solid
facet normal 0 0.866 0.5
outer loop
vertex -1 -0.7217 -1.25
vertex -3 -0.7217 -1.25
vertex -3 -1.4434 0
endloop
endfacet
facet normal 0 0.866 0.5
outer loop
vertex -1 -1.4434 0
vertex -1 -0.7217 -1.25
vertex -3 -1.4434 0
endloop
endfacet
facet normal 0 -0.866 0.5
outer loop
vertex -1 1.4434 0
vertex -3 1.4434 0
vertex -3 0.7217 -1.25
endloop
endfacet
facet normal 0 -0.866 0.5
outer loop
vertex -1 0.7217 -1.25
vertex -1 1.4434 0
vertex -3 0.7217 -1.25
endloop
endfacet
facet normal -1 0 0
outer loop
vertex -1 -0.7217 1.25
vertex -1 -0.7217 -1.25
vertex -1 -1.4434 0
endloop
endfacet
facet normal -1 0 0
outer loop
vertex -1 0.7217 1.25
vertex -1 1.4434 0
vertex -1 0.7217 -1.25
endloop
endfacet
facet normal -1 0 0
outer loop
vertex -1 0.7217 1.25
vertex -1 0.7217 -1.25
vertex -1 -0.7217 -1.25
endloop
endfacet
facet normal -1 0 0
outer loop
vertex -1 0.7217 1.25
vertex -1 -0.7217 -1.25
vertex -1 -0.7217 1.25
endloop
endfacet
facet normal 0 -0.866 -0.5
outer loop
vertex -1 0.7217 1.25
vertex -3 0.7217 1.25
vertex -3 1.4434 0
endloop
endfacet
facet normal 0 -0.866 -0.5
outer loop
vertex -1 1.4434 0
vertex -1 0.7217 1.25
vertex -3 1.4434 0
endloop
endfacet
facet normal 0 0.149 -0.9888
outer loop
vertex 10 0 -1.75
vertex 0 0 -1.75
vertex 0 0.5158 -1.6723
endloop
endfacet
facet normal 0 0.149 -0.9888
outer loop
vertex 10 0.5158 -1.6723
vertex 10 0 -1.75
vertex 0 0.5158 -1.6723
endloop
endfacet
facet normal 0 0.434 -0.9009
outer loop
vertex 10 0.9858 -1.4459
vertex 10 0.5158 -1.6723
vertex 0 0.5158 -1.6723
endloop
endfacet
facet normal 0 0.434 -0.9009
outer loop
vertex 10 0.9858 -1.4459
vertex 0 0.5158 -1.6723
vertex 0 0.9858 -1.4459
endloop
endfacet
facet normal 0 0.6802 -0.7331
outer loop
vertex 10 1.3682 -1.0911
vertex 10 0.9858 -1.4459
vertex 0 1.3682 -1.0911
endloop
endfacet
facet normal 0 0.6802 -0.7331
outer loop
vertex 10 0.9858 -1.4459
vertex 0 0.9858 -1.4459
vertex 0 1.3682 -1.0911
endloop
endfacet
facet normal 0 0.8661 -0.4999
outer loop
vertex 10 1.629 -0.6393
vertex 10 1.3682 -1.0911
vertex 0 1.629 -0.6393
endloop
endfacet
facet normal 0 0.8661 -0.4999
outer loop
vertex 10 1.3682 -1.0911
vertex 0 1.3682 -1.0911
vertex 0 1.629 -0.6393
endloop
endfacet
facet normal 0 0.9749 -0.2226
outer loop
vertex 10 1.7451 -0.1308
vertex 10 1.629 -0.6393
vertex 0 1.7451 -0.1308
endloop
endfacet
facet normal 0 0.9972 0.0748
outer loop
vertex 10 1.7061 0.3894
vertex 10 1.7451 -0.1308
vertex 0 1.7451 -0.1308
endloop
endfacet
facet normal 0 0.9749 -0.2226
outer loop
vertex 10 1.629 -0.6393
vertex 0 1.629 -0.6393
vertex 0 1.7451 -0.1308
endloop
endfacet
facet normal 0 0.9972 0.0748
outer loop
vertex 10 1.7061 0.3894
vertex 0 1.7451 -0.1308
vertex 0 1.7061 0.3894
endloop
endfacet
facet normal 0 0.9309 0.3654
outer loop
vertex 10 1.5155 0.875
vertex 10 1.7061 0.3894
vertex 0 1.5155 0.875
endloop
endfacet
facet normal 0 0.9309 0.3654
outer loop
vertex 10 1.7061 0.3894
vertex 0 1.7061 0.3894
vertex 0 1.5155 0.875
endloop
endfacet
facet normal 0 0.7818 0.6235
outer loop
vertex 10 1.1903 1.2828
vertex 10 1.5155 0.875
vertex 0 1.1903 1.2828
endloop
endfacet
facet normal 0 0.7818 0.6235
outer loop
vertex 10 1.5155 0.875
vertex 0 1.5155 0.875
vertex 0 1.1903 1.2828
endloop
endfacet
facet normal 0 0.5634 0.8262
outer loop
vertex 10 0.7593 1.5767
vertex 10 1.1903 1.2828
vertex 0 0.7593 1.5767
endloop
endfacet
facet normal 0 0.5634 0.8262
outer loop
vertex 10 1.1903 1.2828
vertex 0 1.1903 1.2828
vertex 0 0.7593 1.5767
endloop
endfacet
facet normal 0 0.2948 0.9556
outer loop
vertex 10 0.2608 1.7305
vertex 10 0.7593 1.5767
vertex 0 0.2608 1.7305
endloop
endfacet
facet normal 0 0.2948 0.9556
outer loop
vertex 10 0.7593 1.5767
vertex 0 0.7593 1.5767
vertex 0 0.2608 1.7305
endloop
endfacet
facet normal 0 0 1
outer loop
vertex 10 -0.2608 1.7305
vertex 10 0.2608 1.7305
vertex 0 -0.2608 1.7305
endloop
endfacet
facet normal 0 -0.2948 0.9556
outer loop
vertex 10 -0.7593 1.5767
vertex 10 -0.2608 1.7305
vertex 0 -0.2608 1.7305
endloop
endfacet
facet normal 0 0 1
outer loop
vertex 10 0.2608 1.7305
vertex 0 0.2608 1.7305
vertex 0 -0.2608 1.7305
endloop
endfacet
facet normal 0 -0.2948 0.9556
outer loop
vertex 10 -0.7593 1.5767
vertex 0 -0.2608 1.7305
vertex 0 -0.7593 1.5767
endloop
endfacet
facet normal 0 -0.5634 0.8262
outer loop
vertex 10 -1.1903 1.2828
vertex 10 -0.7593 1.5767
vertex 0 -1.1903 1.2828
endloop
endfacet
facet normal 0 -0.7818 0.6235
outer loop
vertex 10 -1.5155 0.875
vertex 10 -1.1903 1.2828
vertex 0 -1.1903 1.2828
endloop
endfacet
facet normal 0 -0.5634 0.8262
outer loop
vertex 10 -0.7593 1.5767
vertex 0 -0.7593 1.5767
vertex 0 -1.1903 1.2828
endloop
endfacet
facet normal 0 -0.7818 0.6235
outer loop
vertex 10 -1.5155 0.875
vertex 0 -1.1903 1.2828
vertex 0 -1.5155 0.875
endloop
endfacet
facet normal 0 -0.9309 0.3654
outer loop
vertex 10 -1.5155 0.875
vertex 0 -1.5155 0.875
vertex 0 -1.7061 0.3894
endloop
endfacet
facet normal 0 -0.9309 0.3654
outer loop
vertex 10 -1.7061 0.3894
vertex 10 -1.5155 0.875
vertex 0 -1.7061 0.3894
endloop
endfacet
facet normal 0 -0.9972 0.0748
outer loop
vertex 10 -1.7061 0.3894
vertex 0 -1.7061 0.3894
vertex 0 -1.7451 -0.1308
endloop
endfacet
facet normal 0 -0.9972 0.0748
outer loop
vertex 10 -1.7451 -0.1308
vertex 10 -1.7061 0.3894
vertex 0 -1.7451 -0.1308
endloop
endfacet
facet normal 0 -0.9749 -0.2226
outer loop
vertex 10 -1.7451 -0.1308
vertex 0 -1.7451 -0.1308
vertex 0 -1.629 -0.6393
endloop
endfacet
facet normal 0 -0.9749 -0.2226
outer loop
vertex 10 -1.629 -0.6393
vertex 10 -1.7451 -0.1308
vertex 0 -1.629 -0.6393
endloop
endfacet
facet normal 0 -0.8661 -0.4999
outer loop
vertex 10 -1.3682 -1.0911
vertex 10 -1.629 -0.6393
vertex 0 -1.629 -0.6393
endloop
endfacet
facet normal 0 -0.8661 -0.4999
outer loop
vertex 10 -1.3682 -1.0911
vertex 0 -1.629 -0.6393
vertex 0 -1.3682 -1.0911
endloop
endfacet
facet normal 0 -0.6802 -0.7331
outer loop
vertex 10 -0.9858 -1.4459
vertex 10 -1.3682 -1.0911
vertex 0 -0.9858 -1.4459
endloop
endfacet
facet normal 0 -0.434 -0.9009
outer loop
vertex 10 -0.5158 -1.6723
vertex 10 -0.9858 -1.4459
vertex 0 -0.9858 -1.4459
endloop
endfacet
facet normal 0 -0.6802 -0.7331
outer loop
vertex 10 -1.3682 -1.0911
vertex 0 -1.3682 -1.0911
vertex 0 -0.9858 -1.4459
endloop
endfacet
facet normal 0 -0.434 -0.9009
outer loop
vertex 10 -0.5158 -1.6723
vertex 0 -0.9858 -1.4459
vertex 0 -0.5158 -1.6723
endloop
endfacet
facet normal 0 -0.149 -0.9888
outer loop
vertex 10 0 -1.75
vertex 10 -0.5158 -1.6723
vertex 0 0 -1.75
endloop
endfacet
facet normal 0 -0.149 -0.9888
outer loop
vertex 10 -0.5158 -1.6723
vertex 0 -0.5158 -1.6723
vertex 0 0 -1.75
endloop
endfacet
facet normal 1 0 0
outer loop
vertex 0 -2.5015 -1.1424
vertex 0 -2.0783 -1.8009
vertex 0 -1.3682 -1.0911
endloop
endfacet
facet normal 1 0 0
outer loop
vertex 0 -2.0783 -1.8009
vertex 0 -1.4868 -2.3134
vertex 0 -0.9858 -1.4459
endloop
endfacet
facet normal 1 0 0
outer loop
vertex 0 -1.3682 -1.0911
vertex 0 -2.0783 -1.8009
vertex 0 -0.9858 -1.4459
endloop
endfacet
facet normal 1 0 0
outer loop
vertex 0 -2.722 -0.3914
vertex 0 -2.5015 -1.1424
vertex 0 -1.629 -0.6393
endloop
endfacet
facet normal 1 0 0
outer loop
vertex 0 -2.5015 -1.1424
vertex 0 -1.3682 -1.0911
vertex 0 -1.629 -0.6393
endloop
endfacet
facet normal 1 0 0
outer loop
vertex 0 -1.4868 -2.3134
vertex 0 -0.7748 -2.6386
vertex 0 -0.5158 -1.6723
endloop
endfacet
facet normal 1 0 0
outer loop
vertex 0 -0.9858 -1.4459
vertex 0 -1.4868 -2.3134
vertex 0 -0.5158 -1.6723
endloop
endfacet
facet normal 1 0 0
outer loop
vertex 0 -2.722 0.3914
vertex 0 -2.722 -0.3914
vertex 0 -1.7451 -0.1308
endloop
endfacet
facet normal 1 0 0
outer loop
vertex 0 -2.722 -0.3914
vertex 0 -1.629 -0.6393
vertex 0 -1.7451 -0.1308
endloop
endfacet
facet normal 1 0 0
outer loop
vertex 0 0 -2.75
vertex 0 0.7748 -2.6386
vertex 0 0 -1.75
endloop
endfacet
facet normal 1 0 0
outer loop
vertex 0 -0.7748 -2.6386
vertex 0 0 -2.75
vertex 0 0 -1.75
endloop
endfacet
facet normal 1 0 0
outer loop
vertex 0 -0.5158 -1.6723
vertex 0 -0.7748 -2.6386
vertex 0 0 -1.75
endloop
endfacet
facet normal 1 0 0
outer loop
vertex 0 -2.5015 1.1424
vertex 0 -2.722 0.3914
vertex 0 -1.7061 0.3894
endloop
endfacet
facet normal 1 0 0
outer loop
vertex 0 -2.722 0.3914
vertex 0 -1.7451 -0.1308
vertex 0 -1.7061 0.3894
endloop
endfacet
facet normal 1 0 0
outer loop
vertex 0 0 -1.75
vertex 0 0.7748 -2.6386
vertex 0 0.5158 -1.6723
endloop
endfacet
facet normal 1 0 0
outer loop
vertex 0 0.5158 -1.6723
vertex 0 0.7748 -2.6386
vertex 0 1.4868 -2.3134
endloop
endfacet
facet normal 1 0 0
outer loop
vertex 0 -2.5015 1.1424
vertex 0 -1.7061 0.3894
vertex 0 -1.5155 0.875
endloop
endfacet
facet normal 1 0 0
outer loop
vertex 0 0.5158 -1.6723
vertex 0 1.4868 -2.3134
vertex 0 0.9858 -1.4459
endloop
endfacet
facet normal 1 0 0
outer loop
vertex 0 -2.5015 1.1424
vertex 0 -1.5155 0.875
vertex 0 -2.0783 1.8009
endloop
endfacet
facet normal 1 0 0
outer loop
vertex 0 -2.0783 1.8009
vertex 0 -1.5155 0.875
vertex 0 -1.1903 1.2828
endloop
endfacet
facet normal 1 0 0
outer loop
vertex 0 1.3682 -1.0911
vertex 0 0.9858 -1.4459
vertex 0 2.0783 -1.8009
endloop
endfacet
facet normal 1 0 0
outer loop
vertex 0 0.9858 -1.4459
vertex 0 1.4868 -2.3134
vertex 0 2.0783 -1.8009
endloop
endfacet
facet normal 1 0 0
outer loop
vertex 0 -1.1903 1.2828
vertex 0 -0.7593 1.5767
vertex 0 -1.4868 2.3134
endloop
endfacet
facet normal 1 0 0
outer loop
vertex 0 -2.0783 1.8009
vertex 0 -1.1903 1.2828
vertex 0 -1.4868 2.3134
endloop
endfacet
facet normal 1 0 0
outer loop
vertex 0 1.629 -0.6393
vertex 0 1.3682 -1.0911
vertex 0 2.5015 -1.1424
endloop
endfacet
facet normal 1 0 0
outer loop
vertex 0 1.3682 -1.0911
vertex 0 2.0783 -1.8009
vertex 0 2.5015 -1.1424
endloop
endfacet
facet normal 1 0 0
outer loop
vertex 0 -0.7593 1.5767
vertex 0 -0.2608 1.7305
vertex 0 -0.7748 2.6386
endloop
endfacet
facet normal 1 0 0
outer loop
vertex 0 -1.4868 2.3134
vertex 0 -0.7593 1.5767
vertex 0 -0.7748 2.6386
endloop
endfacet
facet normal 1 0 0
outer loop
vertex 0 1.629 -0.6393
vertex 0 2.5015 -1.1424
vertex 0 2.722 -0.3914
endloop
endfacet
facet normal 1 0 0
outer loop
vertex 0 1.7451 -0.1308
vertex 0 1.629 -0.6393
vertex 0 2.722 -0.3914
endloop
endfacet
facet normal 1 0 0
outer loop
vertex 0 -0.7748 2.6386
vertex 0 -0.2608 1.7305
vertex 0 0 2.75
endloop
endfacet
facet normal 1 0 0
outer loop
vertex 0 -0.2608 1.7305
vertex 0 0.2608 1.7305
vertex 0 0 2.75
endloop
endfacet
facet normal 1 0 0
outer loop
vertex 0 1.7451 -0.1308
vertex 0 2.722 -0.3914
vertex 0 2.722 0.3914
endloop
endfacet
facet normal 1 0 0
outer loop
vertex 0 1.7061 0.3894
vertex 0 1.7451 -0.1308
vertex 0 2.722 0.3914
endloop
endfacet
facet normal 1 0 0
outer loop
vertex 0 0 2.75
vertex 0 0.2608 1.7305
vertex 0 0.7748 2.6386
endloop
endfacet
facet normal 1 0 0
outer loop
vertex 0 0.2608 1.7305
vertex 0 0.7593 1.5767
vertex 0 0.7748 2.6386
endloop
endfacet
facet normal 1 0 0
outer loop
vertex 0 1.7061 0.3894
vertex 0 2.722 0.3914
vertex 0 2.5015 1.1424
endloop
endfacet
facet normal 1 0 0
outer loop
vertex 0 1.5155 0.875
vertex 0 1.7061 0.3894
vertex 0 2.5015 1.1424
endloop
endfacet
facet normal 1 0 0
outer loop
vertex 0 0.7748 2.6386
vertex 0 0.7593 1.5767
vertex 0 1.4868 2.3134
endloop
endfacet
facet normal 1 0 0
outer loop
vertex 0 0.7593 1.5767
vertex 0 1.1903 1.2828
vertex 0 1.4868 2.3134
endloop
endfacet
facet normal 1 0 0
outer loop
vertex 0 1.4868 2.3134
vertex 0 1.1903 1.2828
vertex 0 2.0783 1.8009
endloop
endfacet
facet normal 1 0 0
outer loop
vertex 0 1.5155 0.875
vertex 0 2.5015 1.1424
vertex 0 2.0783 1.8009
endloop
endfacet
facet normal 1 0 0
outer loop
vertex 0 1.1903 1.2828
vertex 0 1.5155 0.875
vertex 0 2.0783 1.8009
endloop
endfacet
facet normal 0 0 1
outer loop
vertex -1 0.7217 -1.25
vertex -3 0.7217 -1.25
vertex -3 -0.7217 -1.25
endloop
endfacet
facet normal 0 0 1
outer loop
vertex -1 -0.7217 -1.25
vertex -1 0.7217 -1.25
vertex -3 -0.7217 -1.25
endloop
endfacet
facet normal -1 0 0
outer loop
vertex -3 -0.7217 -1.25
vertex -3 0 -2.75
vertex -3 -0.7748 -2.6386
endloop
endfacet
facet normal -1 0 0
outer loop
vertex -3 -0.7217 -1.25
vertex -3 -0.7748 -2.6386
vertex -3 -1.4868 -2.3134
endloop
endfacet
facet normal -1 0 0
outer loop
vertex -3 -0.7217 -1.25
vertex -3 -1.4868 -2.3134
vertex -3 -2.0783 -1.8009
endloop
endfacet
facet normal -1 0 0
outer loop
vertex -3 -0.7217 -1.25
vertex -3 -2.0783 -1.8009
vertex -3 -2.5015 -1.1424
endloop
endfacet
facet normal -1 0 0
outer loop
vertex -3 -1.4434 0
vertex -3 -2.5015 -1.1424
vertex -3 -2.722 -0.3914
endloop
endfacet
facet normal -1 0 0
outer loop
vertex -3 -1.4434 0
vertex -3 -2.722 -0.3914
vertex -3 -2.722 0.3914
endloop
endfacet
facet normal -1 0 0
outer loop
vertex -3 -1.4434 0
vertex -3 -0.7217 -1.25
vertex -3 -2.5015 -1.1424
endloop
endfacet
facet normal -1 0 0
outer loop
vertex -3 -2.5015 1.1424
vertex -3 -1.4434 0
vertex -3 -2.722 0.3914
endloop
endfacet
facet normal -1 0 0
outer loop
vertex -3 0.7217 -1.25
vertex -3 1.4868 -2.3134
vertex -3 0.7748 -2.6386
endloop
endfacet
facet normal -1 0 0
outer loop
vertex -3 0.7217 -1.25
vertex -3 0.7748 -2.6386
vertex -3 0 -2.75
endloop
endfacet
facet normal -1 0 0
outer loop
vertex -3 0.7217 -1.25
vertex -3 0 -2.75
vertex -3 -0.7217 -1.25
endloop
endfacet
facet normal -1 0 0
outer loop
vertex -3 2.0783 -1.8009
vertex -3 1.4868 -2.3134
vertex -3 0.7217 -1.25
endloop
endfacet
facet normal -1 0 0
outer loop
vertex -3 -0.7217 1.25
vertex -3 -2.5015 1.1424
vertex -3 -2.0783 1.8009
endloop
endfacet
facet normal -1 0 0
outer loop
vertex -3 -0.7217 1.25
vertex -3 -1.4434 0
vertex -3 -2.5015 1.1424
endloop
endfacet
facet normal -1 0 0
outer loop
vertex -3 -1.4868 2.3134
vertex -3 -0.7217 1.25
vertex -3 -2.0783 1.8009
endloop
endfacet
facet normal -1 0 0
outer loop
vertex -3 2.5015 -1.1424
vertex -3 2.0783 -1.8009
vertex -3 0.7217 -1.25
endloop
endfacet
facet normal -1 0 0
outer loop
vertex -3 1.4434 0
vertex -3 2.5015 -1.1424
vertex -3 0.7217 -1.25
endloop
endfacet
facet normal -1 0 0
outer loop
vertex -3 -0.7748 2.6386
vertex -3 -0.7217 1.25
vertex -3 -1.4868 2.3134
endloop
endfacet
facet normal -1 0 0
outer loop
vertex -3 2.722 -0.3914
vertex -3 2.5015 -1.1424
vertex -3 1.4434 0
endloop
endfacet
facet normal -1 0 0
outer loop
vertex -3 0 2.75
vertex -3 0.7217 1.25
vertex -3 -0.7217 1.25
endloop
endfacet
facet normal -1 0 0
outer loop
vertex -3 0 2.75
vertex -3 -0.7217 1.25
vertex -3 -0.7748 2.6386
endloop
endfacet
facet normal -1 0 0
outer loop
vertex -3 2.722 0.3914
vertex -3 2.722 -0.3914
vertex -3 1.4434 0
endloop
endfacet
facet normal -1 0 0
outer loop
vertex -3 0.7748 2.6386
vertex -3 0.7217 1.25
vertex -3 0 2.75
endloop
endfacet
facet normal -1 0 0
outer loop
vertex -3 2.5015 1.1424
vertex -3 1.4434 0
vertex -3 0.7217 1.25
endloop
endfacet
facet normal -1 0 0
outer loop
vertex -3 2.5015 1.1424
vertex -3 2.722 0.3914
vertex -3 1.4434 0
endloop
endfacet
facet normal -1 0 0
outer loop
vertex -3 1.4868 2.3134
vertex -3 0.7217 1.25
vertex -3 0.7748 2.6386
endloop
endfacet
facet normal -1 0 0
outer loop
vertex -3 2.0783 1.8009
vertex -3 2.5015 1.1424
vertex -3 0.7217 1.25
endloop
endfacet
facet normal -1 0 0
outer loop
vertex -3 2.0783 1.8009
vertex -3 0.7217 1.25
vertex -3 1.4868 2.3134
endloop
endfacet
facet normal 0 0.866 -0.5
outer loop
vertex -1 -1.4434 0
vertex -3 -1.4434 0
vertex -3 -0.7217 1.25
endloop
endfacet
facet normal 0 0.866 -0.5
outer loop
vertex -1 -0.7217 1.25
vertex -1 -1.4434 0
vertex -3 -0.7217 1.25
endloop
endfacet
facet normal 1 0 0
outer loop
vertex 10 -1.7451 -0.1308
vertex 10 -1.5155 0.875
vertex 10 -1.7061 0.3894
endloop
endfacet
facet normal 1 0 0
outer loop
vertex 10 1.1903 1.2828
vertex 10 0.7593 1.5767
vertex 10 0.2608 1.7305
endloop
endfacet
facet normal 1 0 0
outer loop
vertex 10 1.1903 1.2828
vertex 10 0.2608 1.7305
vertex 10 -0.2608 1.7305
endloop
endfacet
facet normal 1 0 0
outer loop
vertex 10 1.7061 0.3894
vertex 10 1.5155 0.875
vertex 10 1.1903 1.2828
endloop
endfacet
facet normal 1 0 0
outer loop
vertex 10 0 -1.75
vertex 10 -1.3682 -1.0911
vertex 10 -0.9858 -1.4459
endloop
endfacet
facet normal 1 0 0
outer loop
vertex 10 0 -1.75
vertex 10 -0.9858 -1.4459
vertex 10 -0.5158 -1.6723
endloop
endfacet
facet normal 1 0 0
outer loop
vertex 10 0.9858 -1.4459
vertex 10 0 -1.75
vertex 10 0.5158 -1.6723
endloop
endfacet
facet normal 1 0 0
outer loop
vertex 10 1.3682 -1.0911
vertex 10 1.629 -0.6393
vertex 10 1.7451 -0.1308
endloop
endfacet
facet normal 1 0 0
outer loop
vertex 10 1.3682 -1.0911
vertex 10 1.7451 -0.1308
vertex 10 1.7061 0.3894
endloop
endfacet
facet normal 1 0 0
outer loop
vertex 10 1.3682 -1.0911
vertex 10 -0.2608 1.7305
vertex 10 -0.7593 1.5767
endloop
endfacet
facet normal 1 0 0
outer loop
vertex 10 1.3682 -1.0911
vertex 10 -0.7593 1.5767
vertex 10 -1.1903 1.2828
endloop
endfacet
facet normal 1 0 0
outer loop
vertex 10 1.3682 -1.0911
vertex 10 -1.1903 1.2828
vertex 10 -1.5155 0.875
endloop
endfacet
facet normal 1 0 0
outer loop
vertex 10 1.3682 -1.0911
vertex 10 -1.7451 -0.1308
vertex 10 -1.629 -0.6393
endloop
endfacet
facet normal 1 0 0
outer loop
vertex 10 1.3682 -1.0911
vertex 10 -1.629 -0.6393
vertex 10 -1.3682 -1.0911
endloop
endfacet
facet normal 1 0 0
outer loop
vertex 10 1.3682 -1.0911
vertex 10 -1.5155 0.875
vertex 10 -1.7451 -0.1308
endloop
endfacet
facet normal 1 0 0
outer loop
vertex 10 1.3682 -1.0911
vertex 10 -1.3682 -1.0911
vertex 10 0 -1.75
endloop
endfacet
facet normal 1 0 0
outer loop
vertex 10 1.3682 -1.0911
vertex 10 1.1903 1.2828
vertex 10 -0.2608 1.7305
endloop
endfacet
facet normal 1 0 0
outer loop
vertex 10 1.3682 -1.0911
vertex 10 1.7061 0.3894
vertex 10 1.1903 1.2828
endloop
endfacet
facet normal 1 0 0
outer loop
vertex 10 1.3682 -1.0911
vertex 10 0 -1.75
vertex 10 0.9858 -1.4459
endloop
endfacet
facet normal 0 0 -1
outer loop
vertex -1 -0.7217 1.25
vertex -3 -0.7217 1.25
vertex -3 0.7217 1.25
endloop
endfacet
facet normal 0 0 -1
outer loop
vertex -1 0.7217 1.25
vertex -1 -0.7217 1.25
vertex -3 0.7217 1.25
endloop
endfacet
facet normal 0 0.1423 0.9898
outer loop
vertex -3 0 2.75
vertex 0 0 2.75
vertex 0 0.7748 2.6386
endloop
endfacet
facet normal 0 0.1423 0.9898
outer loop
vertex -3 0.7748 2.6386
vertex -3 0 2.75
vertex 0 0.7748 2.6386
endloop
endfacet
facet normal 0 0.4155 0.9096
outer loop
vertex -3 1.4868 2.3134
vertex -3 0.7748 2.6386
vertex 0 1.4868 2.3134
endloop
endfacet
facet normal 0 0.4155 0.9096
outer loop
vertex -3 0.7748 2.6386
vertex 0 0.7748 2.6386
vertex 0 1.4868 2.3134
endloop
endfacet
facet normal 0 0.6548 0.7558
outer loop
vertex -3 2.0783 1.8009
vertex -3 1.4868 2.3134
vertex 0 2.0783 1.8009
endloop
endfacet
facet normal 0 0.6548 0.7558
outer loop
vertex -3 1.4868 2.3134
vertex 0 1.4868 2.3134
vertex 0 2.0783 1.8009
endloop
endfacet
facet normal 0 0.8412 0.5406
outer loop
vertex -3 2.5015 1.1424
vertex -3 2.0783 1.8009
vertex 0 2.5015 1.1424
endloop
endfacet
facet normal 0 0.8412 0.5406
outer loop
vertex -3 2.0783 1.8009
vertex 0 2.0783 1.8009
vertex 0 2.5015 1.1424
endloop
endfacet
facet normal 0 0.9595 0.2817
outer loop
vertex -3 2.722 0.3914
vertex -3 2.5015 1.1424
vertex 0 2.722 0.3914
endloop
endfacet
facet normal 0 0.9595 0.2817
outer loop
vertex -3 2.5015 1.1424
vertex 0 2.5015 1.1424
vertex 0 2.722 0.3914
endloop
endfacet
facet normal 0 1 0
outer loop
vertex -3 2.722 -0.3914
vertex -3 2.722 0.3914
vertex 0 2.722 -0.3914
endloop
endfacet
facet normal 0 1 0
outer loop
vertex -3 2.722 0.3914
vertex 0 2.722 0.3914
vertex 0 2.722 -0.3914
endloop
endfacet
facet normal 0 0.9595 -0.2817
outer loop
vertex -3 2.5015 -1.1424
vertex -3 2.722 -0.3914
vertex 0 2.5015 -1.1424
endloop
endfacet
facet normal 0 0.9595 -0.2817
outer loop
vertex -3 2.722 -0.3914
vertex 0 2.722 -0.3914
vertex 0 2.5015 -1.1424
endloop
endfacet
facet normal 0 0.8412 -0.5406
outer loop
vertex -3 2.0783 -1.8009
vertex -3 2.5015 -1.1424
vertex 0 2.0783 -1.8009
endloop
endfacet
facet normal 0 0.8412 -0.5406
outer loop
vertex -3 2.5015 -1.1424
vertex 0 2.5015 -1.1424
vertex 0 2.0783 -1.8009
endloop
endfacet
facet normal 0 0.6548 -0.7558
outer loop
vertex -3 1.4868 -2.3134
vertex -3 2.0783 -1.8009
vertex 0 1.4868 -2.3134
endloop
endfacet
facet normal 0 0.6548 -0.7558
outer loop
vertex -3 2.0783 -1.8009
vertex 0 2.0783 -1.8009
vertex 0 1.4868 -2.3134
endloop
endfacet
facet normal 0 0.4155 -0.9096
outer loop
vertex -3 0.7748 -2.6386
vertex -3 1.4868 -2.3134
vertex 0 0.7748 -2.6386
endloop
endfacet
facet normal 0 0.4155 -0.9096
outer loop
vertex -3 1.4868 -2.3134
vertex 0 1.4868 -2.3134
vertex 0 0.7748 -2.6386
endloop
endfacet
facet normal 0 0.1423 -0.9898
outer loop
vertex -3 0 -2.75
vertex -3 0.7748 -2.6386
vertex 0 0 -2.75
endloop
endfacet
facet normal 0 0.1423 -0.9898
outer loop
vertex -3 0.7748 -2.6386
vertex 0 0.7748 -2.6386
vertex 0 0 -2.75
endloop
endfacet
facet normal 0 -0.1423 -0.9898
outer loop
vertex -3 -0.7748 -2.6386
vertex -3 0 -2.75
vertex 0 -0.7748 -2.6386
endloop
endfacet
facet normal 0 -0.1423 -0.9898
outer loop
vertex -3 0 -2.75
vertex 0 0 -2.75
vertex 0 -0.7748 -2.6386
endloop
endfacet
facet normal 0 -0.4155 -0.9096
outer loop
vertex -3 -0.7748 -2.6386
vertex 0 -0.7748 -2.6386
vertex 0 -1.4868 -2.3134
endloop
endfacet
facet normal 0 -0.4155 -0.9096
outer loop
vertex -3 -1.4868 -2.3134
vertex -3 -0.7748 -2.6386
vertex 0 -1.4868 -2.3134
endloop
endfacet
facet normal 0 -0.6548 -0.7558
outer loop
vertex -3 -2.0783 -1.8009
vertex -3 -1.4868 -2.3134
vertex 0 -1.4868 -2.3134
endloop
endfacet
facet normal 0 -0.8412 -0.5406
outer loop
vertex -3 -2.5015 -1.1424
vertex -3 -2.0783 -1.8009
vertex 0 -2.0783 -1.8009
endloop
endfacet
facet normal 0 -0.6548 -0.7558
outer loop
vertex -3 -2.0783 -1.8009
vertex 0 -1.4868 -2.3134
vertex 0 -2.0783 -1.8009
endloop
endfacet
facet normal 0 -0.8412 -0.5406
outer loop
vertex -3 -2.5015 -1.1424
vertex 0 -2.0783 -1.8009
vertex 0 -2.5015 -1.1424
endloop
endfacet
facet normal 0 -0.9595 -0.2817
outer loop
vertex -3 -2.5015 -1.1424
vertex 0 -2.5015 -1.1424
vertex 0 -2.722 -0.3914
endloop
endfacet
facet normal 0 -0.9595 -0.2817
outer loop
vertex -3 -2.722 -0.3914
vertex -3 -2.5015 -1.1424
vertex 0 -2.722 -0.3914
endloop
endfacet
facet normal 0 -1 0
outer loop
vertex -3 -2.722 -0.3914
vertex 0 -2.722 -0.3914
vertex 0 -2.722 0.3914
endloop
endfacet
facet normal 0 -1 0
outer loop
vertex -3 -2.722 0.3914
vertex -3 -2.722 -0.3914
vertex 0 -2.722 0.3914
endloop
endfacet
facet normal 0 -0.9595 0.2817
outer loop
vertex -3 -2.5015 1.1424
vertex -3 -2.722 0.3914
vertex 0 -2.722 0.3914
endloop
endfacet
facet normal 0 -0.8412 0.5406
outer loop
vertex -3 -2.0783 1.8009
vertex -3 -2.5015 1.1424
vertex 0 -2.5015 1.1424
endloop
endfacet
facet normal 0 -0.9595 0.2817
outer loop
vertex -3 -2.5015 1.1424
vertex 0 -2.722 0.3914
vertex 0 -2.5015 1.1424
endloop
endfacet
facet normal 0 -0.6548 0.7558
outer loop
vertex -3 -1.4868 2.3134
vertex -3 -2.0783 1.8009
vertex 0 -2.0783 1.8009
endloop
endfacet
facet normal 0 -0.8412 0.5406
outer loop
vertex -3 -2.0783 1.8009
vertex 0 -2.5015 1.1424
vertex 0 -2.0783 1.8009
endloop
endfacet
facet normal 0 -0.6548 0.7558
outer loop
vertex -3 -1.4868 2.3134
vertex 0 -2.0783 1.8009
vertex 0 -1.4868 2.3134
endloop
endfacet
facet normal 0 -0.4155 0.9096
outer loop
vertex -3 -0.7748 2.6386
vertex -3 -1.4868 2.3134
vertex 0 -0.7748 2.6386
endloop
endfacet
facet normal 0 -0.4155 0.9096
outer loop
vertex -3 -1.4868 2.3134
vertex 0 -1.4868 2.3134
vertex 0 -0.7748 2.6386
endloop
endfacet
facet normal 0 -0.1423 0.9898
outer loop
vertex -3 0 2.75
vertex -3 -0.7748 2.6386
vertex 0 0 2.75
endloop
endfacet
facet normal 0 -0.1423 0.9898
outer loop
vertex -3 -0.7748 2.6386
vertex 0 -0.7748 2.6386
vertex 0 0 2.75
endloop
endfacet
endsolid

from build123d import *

# Parameters (mm, degrees)
SKETCH1_R             = 1.75
THREADED_SCREW_DEPTH  = 10
SKETCH2_R             = 2.75
ROUND_HEAD_DEPTH      = 3
HEX_SOCKET_SIZE_DEPTH = 2


with BuildPart() as part:
    # Sketch1 → Threaded_Screw (new body)
    with BuildSketch(Plane(origin=(0, 0, 0), x_dir=(0, 0, -1), z_dir=(1, 0, 0))):
        Circle(SKETCH1_R)
    extrude(amount=THREADED_SCREW_DEPTH)

    # Sketch2 → Round_Head (add)
    with BuildSketch(Plane.ZY):
        Circle(SKETCH2_R)
    extrude(amount=ROUND_HEAD_DEPTH)

    # Sketch3 → Hex_Socket_Size (cut)
    with BuildSketch(Plane.ZY.offset(3)):
        Polygon((1.25, -0.721687836), (1.25, 0.721687836), (0, 1.443375673), (-1.25, 0.721687836), (-1.25, -0.721687836), (0, -1.443375673), align=None)
    extrude(amount=-HEX_SOCKET_SIZE_DEPTH, mode=Mode.SUBTRACT)


solid = part.part
